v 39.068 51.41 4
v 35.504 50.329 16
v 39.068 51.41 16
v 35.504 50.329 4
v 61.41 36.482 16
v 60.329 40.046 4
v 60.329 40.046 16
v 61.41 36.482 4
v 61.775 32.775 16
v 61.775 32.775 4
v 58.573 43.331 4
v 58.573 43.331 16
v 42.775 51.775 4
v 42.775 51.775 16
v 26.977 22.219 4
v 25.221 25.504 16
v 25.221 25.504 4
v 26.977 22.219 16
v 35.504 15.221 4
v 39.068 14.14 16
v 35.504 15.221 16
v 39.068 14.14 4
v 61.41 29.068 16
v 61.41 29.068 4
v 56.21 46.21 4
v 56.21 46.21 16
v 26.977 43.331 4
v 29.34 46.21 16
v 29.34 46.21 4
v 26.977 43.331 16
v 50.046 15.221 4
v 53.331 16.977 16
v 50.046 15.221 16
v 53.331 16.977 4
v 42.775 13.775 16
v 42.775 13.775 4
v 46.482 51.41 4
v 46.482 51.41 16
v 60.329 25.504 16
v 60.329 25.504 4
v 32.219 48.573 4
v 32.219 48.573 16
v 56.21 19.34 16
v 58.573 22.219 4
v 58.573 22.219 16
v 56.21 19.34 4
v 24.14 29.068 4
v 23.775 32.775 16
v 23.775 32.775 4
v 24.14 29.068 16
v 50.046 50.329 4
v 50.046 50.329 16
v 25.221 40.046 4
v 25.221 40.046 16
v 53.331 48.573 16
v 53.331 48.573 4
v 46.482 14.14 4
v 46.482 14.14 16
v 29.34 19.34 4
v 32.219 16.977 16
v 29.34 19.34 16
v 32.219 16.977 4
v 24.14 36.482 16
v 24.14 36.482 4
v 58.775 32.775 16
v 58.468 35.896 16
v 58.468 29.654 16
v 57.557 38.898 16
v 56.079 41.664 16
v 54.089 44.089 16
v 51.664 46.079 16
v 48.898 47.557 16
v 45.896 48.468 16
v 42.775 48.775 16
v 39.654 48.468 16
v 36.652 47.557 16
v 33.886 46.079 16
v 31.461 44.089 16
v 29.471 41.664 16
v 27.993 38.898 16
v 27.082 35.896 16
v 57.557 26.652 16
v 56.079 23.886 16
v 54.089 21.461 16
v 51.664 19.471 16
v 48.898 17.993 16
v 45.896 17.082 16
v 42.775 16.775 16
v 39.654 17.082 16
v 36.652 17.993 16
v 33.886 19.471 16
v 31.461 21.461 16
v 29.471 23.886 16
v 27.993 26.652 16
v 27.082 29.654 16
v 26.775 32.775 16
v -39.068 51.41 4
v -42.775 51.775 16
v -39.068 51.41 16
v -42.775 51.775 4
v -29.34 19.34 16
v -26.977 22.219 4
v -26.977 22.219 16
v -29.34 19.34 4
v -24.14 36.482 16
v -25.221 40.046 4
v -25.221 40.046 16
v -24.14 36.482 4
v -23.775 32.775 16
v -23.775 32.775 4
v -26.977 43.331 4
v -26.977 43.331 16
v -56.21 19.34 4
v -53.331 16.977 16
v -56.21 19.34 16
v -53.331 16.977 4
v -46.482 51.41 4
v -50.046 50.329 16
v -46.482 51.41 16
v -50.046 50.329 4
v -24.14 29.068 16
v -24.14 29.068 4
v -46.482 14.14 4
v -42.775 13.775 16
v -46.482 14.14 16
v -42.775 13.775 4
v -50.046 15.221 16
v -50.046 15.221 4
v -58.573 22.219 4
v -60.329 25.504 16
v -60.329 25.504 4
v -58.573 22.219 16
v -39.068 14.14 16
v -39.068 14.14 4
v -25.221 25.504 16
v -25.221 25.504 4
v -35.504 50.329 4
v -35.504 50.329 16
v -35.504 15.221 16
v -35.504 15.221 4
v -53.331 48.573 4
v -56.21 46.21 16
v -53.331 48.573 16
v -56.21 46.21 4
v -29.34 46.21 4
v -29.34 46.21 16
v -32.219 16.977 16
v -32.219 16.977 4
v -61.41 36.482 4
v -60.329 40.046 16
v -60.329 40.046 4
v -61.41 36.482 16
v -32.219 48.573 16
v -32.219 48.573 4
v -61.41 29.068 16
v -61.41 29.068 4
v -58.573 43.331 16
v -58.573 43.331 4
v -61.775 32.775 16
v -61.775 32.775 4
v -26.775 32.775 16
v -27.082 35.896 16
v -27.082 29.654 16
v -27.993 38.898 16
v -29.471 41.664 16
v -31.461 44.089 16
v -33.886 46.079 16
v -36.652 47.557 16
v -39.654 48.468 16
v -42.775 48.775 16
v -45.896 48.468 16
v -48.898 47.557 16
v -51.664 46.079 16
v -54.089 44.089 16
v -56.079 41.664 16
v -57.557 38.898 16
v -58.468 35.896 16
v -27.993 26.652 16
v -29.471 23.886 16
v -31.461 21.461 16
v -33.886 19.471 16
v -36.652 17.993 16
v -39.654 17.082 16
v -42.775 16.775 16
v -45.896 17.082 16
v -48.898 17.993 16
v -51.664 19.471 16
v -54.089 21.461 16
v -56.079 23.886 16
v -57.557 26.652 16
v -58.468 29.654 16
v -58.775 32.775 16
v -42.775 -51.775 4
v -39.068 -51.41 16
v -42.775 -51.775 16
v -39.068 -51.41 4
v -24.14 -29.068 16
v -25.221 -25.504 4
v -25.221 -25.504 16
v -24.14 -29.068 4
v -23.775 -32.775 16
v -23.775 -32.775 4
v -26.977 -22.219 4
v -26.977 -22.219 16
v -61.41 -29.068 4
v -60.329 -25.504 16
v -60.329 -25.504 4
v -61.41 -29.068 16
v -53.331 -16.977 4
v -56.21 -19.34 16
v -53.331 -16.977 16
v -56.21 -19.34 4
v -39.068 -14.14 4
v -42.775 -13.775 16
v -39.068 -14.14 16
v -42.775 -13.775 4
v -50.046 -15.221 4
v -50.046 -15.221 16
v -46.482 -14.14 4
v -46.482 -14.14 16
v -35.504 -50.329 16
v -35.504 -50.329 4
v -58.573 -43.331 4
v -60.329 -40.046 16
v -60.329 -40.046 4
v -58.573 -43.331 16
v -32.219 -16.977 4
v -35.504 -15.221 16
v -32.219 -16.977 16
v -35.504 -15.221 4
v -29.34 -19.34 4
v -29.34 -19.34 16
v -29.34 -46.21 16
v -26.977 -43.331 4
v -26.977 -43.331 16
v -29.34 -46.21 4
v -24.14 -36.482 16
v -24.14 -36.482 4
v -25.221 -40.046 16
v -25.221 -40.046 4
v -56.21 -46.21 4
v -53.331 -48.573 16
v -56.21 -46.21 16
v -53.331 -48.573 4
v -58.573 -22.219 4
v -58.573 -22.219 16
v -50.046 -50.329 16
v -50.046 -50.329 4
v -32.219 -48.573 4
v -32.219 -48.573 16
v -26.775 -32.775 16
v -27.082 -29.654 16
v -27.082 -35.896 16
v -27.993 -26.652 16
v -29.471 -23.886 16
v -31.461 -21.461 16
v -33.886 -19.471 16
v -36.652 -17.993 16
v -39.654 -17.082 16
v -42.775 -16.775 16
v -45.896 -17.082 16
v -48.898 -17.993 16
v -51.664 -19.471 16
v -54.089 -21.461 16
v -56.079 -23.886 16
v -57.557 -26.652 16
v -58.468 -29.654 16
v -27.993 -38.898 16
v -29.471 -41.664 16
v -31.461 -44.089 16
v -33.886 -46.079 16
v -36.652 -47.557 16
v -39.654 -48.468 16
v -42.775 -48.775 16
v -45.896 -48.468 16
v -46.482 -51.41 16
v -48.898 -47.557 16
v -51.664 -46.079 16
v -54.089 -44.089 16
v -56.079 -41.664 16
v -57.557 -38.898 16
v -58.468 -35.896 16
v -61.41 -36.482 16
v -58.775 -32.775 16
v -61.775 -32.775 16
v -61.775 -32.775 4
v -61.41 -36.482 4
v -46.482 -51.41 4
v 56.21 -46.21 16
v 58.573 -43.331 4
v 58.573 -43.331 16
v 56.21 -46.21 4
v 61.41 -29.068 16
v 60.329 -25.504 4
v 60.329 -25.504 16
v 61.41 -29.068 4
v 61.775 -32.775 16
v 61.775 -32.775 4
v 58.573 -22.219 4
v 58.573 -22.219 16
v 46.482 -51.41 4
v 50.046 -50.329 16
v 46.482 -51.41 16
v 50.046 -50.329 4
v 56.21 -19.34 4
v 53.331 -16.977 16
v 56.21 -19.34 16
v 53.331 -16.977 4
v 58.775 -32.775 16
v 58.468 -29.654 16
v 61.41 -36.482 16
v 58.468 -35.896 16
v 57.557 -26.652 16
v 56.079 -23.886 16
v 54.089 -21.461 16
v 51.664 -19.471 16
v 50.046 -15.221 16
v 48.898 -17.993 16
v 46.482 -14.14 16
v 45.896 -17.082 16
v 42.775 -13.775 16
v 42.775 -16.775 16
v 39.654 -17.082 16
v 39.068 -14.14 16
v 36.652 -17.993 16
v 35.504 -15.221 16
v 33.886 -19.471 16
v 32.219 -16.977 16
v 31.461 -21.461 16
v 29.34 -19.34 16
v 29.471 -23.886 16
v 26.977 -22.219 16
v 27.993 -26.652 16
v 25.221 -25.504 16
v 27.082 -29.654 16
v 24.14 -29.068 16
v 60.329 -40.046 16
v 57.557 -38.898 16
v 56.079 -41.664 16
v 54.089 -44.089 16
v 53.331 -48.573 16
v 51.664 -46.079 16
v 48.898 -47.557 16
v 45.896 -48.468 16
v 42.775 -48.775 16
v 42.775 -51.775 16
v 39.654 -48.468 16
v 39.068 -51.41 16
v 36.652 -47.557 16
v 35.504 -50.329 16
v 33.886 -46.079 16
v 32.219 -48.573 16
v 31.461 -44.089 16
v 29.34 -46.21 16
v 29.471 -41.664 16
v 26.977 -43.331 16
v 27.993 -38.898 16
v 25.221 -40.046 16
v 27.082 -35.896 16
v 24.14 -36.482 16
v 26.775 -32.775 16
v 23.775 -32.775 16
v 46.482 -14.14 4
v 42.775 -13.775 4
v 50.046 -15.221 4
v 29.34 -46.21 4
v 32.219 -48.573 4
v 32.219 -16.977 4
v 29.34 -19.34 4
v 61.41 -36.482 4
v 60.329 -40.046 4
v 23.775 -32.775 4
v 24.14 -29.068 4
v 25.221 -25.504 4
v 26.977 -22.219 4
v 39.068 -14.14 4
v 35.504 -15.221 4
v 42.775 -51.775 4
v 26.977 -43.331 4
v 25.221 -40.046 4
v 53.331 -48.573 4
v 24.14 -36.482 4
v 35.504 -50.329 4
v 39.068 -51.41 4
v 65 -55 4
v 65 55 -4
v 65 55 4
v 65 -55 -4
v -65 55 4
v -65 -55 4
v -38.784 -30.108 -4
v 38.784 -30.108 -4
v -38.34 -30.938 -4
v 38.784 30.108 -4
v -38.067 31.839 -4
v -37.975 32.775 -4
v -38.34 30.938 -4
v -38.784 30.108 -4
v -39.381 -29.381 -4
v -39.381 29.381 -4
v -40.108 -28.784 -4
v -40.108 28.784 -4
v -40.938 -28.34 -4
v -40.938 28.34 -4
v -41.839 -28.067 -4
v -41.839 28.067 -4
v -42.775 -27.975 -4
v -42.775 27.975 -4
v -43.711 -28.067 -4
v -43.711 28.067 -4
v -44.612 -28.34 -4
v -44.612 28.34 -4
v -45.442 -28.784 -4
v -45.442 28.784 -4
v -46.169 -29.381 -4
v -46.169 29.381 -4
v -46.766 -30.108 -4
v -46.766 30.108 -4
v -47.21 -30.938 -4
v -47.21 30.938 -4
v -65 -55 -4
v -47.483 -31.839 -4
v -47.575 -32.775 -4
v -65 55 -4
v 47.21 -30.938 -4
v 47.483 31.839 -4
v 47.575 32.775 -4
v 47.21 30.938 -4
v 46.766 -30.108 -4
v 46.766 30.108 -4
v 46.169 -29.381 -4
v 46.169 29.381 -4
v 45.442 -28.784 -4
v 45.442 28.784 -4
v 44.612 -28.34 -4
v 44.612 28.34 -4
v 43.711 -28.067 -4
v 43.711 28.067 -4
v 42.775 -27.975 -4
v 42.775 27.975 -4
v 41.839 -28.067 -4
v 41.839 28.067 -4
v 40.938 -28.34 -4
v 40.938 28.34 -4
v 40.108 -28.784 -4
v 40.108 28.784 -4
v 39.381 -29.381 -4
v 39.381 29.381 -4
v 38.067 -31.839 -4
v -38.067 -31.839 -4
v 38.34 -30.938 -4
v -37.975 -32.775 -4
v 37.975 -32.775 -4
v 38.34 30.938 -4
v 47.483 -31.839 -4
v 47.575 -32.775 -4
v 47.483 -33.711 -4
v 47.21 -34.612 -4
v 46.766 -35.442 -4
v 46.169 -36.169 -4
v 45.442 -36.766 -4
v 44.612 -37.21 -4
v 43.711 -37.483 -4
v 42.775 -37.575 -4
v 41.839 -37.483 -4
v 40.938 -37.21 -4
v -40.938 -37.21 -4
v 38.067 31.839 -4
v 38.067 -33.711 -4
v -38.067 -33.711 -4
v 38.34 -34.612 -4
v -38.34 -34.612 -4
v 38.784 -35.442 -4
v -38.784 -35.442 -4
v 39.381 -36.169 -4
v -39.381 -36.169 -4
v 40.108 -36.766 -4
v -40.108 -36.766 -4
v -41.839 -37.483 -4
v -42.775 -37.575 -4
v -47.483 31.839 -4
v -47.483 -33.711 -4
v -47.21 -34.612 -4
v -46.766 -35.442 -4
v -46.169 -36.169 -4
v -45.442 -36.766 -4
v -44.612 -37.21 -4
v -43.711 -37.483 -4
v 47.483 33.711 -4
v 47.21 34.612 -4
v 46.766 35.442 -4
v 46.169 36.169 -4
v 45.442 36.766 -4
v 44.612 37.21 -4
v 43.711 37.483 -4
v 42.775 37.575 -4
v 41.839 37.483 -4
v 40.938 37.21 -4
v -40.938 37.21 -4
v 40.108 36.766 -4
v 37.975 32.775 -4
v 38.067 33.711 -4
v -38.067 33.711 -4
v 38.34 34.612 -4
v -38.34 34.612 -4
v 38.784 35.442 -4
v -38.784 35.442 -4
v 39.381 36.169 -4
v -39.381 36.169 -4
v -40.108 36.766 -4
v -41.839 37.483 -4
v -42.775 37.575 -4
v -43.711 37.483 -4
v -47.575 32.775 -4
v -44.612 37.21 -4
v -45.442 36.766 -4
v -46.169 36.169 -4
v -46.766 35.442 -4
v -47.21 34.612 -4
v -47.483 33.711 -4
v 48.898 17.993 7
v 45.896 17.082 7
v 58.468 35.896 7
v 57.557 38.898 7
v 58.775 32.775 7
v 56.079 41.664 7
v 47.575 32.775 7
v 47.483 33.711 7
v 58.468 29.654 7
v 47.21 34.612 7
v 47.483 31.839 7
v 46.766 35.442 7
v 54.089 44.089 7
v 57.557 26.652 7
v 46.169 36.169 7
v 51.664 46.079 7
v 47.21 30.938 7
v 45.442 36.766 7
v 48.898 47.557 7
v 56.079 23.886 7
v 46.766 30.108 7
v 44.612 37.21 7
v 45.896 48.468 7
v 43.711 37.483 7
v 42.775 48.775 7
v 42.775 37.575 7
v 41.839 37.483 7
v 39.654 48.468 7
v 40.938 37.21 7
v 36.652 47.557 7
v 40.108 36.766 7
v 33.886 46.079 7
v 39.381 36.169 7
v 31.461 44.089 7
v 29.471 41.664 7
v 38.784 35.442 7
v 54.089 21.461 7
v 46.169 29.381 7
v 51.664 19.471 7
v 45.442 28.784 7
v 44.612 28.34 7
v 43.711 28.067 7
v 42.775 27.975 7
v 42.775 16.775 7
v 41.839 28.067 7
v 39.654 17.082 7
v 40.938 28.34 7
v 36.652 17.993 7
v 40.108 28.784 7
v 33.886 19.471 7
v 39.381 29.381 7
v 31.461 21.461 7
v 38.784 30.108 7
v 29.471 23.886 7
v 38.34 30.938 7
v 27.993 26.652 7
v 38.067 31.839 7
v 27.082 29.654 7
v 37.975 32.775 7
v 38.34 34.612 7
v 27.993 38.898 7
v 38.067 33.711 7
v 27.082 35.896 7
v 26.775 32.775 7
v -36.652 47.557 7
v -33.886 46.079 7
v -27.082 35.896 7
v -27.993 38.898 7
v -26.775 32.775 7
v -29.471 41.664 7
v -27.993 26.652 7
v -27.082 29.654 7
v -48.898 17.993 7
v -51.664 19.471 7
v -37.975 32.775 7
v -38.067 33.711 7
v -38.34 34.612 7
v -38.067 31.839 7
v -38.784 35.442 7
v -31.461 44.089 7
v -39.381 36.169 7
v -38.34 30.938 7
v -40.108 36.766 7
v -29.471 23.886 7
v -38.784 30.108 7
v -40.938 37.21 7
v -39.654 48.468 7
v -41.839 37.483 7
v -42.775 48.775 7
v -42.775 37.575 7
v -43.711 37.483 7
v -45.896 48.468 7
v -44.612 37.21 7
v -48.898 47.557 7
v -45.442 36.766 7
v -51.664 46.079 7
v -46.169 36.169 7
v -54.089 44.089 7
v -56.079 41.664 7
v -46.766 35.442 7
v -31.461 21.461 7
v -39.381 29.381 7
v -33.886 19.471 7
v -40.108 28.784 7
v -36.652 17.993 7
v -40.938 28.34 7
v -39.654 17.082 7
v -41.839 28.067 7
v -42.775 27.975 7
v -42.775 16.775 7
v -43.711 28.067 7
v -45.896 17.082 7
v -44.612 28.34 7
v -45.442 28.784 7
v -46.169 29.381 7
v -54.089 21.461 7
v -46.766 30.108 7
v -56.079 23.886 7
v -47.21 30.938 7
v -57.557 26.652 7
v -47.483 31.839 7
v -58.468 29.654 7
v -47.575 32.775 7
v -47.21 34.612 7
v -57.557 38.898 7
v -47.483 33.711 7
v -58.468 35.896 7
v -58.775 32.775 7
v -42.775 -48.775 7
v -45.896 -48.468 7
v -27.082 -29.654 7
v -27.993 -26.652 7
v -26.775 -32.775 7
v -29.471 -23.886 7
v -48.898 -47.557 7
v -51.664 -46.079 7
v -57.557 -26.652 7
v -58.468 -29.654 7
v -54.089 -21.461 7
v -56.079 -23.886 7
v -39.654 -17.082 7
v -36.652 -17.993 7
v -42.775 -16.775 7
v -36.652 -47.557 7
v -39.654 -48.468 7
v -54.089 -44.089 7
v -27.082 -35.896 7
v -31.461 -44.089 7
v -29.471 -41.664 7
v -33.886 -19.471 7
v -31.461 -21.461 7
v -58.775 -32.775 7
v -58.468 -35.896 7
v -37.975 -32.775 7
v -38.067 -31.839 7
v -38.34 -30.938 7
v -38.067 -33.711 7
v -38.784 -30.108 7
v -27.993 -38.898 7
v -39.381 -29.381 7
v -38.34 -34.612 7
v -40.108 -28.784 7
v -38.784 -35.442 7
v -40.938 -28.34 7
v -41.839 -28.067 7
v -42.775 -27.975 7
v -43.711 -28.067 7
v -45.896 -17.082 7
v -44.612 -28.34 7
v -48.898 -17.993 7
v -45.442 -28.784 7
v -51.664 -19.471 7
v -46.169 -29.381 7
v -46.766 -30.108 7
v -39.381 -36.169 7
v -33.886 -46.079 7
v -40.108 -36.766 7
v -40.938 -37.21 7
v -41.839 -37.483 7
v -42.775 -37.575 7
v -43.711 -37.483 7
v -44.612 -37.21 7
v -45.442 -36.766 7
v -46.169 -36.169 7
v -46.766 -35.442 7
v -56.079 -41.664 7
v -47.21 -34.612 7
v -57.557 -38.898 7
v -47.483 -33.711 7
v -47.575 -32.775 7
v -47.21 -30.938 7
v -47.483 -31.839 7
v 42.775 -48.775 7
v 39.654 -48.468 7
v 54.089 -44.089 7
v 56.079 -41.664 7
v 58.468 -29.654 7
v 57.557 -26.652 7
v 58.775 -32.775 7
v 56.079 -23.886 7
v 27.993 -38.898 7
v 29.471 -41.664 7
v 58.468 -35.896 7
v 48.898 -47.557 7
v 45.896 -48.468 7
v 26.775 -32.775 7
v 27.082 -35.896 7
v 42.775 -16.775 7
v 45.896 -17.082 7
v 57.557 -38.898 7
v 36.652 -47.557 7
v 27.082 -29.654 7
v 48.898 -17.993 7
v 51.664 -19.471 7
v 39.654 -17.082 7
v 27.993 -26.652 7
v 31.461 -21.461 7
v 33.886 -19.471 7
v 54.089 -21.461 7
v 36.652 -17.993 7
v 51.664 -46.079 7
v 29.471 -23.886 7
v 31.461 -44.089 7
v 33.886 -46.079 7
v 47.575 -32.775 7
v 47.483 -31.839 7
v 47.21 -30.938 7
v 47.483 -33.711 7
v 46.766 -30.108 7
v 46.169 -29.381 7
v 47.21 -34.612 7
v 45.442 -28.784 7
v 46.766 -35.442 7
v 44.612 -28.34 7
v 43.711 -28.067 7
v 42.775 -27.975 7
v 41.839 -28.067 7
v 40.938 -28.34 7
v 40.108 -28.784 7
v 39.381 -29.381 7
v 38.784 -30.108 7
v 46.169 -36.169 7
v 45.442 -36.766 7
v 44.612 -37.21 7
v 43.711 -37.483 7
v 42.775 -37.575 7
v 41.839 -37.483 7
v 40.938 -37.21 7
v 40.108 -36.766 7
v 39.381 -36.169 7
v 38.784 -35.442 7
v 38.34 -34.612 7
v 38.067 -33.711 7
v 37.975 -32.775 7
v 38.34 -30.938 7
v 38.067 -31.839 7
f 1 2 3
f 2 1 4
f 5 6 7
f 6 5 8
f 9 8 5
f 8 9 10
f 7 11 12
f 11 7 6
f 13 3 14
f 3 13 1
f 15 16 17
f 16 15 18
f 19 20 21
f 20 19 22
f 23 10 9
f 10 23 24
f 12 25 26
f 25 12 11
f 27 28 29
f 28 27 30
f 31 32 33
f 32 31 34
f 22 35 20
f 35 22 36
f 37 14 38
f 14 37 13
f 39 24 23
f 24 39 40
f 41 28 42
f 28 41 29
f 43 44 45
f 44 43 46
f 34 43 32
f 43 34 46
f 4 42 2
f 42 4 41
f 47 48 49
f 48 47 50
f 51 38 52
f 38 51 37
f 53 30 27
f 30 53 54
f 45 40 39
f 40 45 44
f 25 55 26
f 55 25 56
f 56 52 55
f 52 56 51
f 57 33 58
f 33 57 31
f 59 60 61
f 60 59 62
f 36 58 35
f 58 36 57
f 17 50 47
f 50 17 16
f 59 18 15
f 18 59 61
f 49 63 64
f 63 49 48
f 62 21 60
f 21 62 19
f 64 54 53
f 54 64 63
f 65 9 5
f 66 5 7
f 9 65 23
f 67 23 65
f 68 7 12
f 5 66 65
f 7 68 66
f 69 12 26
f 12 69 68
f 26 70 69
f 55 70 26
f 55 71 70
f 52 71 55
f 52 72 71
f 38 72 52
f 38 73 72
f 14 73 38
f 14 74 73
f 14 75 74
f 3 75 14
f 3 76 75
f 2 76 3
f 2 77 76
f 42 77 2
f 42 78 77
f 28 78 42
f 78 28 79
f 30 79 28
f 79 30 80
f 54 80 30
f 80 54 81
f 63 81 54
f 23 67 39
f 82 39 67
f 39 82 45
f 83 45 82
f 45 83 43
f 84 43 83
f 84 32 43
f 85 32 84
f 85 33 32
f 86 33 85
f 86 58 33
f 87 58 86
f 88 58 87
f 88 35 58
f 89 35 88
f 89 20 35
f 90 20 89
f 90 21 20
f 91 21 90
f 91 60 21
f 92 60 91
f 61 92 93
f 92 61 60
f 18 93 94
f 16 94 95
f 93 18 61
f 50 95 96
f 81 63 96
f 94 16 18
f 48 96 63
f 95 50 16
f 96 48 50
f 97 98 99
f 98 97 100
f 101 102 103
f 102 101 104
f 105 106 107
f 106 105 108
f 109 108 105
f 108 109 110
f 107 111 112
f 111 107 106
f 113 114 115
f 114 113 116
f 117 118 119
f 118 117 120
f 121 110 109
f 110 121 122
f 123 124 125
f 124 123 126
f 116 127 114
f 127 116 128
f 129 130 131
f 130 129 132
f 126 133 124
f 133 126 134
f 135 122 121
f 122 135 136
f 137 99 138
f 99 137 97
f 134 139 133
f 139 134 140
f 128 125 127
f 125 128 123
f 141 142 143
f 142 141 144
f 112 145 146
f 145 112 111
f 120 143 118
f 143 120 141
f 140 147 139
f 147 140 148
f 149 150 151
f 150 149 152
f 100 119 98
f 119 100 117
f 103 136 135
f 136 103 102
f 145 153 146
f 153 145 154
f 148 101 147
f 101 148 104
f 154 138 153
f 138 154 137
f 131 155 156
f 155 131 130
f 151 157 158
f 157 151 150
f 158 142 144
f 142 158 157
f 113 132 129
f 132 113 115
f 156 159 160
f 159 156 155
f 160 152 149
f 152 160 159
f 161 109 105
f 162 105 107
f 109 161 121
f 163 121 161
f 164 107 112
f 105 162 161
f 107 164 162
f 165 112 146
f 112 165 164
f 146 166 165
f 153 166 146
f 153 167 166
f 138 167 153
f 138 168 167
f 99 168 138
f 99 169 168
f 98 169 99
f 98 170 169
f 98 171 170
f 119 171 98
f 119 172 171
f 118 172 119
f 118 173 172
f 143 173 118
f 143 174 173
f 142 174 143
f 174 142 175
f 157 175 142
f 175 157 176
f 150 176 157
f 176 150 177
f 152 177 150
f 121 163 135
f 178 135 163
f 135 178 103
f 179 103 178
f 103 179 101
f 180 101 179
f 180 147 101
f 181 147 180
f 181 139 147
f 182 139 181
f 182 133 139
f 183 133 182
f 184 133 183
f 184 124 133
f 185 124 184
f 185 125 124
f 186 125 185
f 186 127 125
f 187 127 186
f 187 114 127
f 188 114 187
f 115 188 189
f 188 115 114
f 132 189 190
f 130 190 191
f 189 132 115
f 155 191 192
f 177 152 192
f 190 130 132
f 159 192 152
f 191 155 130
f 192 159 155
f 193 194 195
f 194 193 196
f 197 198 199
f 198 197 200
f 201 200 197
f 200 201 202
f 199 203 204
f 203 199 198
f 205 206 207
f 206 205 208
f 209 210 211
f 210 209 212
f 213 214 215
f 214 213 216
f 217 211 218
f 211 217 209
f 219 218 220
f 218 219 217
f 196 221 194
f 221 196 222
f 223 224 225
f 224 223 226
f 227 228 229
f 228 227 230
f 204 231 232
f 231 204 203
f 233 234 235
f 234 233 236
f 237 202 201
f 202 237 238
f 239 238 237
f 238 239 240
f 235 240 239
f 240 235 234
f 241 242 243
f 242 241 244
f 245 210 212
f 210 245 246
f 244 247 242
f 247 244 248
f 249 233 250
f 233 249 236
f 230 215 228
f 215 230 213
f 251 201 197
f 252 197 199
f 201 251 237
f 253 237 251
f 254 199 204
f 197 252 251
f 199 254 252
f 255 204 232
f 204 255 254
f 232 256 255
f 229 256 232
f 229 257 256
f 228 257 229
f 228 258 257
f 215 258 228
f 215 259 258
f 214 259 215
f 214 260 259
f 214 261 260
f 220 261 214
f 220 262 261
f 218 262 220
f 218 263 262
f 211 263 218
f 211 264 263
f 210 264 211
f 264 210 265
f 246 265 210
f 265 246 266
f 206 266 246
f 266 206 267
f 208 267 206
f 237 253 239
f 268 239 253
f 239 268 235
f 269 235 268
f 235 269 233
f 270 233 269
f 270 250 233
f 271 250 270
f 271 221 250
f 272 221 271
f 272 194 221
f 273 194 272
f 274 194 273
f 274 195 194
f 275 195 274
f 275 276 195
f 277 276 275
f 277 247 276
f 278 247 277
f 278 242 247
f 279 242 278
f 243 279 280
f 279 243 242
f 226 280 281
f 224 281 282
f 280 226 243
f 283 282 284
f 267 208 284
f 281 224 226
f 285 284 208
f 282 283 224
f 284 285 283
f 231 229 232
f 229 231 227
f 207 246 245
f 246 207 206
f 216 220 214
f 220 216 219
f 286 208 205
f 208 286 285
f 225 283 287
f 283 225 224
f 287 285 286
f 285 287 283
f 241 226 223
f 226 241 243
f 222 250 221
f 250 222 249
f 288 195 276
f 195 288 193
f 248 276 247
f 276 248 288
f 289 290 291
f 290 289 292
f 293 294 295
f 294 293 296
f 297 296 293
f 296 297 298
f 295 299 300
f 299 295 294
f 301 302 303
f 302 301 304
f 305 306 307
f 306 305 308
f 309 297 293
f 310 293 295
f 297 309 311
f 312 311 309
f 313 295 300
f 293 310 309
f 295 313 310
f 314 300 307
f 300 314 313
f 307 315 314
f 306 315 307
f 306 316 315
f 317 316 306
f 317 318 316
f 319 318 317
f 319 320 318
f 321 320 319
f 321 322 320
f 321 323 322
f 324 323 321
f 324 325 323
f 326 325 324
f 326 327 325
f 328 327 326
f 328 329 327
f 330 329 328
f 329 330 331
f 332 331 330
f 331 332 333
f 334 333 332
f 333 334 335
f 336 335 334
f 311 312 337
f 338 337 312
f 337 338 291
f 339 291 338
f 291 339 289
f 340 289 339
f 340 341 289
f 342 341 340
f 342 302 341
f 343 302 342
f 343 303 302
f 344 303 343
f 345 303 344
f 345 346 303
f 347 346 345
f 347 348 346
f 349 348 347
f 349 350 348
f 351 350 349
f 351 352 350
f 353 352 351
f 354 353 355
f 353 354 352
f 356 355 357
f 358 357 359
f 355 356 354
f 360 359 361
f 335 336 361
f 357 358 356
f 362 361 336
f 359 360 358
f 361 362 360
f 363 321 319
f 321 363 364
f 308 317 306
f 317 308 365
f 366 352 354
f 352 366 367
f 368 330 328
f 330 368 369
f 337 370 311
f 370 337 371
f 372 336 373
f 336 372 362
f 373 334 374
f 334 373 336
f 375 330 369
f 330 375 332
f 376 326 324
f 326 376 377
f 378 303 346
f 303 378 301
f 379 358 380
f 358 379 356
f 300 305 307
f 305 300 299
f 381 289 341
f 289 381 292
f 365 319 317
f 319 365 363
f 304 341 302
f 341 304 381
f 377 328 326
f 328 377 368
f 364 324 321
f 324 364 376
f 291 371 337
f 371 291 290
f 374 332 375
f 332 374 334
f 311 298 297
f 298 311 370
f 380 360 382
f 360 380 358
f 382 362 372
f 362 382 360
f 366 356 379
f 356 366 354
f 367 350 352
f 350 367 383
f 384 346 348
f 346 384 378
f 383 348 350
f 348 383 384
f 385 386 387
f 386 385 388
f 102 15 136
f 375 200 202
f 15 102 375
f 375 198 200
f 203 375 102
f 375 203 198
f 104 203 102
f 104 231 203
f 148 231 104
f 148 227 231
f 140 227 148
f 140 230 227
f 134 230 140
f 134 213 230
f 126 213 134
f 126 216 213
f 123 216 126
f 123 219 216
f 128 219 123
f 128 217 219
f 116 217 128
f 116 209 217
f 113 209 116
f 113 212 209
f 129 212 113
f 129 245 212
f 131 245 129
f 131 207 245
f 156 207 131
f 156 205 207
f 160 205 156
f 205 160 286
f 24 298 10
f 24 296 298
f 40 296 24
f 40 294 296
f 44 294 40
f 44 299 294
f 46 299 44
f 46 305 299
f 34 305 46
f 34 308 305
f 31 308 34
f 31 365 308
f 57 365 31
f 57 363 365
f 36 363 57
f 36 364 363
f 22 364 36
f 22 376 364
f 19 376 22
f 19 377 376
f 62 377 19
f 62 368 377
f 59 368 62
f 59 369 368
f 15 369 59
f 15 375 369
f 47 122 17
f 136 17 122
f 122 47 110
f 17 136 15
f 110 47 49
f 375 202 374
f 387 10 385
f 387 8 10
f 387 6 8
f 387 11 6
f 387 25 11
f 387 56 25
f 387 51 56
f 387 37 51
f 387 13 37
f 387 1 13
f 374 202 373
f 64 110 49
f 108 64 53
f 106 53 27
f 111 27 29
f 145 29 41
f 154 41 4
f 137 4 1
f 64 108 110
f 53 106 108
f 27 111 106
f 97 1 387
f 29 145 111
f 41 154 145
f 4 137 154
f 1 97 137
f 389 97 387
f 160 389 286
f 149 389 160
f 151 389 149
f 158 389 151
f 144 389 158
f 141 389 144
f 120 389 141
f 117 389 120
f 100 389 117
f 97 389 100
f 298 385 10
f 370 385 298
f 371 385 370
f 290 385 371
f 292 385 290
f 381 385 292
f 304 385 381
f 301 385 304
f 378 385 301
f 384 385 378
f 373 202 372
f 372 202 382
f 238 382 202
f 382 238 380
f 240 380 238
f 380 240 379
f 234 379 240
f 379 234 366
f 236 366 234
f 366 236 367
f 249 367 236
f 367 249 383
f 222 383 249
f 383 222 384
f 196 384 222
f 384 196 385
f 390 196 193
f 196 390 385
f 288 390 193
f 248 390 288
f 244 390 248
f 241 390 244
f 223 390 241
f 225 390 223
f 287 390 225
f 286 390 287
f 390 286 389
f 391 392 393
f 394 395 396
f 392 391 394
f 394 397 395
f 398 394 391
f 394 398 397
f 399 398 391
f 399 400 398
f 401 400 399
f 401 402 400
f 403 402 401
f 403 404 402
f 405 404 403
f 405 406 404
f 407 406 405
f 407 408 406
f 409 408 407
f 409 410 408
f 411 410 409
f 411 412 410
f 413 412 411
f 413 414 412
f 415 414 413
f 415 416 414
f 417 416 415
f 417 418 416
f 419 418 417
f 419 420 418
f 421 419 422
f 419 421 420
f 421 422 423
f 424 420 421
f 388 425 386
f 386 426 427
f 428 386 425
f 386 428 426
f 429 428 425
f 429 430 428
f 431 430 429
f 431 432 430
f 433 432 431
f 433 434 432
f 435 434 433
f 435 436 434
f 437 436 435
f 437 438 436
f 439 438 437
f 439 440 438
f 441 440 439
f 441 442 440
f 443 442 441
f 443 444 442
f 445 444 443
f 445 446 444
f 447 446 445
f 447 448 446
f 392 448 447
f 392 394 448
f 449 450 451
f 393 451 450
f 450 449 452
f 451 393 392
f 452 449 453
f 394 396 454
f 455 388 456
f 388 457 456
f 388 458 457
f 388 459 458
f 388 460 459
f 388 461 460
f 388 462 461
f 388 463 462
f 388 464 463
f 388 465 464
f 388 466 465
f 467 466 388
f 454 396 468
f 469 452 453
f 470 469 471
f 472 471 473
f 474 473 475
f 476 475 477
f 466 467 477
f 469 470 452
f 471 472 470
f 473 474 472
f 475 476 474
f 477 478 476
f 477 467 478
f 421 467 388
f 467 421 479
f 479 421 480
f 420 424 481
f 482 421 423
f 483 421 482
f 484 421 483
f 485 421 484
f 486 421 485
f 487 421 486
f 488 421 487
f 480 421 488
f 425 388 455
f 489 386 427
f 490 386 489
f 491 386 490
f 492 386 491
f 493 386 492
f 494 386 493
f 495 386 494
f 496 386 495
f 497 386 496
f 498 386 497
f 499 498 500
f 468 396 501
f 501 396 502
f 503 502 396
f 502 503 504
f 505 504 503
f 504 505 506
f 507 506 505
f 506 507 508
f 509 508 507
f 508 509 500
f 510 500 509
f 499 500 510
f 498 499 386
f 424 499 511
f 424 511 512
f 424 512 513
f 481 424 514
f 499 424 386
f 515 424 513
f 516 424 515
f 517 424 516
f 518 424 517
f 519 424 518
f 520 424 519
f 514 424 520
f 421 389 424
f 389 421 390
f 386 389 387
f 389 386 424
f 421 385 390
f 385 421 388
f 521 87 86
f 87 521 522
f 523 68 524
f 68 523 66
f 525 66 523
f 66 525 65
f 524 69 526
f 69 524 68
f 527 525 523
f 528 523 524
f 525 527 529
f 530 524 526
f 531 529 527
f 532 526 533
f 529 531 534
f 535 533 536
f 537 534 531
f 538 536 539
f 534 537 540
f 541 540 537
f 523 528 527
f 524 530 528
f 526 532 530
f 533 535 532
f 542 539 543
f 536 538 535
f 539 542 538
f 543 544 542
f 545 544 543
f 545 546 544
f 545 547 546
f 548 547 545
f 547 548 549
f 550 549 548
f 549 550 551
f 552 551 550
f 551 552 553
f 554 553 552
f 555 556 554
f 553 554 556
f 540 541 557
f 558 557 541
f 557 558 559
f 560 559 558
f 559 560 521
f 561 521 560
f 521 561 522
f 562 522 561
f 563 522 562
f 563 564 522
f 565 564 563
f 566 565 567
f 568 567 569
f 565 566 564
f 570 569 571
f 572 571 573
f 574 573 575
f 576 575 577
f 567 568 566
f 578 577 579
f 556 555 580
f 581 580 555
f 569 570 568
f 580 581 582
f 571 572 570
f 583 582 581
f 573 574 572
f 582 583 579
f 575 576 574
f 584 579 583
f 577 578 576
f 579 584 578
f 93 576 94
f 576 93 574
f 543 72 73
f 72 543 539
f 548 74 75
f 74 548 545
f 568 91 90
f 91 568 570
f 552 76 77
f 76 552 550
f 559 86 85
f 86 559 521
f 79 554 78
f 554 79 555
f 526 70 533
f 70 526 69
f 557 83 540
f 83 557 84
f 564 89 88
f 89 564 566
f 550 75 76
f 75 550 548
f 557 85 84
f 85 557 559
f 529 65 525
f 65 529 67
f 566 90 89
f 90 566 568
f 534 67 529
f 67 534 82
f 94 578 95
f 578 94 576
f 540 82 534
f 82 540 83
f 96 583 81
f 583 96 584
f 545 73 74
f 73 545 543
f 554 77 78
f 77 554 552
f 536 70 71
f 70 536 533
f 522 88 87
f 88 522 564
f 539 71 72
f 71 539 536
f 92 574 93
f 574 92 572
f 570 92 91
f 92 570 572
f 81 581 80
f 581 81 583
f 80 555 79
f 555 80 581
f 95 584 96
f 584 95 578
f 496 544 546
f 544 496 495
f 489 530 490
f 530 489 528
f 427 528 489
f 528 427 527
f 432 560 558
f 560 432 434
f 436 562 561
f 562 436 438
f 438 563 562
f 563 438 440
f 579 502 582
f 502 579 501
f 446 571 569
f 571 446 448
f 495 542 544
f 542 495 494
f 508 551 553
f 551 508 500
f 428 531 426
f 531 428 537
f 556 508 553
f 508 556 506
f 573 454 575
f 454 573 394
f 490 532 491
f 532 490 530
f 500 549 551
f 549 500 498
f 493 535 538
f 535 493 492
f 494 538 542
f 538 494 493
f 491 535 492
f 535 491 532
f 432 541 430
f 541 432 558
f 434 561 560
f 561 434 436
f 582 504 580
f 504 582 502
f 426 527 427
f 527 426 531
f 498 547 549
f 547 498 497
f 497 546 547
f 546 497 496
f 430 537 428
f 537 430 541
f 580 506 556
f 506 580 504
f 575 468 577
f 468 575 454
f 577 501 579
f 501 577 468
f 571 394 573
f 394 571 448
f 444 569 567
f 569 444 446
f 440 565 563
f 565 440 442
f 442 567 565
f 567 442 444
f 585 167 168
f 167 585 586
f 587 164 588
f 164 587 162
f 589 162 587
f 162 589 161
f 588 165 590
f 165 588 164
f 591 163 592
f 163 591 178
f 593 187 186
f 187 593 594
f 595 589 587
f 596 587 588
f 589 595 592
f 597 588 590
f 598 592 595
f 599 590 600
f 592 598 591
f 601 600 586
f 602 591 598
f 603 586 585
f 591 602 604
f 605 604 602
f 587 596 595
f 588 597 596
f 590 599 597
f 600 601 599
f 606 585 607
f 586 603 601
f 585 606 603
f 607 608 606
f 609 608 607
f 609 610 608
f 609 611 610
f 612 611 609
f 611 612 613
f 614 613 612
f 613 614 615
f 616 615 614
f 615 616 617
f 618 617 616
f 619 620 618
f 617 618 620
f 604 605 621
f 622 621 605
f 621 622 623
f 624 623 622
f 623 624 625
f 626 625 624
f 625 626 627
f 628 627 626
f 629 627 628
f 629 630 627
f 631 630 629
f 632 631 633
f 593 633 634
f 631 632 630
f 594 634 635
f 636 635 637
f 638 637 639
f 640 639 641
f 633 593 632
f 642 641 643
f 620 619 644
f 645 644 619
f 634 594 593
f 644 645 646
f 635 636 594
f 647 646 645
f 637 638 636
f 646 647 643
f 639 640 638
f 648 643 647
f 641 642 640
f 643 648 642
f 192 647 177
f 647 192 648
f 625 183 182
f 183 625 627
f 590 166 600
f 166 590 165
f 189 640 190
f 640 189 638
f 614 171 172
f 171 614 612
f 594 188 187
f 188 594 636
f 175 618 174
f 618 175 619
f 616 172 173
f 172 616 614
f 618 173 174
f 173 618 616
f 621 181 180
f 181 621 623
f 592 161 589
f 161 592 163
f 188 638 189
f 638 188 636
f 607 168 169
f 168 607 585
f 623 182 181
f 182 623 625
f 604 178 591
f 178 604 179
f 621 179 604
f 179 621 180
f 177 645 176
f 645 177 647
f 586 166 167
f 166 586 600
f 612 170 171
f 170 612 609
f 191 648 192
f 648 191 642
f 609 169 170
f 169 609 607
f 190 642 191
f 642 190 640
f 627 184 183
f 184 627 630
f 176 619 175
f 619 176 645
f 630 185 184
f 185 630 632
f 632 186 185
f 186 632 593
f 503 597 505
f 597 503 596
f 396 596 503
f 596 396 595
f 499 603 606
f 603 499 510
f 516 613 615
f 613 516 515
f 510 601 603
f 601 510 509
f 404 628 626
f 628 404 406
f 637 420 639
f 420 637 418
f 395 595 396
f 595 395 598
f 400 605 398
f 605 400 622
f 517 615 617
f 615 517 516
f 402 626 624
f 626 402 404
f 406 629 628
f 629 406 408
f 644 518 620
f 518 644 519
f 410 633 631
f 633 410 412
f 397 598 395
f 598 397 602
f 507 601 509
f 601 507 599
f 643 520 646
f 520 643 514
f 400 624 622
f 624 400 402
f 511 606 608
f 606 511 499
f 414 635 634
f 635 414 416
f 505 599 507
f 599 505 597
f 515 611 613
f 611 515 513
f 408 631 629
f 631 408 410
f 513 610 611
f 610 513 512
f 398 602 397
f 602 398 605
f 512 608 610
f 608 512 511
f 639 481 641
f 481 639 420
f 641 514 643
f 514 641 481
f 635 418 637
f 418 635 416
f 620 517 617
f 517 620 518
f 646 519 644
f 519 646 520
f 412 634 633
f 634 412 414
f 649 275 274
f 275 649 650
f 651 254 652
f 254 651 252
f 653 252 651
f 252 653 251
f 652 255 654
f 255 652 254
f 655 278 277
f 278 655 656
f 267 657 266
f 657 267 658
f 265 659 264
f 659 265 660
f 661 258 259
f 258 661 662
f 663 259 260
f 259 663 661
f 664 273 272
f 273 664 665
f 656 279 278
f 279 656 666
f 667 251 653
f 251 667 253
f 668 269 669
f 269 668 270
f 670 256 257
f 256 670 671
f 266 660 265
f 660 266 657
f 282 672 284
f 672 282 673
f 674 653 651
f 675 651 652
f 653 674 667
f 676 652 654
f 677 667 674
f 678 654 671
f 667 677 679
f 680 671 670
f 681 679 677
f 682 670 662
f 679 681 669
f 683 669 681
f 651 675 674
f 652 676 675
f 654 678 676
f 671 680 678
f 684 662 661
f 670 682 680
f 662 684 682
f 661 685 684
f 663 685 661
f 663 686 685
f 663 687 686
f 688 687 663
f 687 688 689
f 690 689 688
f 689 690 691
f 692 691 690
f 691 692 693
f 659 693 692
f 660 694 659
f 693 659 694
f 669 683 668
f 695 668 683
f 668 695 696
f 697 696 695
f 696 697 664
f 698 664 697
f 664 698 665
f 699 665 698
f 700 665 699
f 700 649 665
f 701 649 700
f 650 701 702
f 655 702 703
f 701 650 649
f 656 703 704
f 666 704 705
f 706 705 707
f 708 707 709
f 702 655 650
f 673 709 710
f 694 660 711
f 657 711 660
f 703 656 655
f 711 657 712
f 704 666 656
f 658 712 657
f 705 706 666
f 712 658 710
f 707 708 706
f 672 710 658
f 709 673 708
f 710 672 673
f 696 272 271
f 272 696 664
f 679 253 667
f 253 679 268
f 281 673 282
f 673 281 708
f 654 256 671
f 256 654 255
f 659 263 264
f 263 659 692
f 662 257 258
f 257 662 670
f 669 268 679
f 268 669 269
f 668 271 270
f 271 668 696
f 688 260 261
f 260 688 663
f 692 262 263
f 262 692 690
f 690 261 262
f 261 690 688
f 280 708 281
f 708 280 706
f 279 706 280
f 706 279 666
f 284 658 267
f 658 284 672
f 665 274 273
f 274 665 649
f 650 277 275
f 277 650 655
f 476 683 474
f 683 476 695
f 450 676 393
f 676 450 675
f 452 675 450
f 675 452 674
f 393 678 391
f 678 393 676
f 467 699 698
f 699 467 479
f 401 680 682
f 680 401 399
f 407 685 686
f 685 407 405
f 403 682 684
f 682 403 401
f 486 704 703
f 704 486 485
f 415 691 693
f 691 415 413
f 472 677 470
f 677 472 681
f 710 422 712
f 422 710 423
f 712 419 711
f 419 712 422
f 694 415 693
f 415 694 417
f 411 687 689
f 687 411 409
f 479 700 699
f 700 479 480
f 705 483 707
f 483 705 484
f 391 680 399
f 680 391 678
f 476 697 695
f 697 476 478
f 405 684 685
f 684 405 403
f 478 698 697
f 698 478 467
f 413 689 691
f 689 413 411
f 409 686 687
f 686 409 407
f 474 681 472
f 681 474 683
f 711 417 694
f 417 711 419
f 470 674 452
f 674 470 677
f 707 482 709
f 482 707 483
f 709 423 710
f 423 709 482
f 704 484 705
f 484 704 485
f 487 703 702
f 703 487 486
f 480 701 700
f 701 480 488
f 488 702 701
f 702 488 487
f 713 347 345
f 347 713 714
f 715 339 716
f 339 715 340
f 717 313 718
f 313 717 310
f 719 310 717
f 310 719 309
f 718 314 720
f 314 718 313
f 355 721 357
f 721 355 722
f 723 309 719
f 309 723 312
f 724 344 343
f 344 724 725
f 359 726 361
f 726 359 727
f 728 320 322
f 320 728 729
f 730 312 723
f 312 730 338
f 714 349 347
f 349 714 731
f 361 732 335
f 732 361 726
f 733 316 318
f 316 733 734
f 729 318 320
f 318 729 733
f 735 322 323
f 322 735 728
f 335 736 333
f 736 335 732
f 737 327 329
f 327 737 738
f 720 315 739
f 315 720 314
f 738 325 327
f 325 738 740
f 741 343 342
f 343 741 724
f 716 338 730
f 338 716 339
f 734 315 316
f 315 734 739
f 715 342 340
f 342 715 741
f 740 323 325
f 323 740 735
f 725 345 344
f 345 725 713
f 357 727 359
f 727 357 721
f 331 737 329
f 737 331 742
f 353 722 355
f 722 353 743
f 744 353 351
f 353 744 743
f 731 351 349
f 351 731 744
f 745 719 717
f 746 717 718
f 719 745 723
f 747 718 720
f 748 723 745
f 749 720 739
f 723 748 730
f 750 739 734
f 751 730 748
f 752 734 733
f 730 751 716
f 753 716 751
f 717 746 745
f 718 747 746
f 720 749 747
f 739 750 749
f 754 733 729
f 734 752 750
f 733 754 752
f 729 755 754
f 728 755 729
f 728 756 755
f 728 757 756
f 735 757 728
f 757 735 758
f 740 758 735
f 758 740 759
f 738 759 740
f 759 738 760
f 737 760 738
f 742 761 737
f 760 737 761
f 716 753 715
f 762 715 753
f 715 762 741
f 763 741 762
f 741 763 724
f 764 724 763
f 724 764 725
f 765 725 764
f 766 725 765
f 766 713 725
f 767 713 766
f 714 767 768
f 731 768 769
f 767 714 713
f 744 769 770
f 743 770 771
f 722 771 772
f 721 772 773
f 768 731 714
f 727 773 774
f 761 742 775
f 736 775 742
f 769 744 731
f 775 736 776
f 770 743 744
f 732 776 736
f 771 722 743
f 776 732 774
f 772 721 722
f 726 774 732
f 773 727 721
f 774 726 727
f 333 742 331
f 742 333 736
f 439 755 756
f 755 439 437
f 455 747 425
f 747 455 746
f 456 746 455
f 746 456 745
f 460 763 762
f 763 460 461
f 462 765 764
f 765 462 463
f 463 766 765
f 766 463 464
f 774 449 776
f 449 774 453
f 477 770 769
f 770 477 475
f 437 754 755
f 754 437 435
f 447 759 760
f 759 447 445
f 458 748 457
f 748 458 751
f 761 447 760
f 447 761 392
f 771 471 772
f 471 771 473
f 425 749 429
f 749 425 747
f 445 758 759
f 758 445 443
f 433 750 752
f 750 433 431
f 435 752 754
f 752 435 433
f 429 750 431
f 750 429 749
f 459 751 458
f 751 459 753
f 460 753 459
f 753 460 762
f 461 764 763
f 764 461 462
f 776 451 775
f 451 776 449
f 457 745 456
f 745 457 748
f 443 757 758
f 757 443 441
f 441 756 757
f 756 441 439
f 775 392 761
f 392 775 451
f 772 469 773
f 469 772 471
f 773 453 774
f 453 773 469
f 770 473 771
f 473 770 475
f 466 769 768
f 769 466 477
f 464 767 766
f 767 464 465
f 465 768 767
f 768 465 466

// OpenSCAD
$fn = 32;

// ----------------------------------------------------------------------
// Socket pad plate
// bosses with counterbored sockets for the screws
// ----------------------------------------------------------------------

// --- parameters (mm) ---
base_t = 8;             // base plate thickness
boss_h = 12;            // boss height above the base plate
boss_d = 38;            // boss diameter
socket_d = 32;          // socket diameter
socket_depth = 9;       // socket depth from the boss face
bolt_d = 9.6;           // screw clearance hole through the socket floor
plate = [130, 110, 8];  // overall size (x, y, z)
edge = 22.225;          // boss centre offset from the plate edge
pads = 4;               // boss count, one per corner

// --- derived feature positions (mm) ---
height = base_t + boss_h;        // = 20   overall height of the part
corner_x = plate[0] / 2 - edge;  // = 42.77   boss centre X
corner_y = plate[1] / 2 - edge;  // = 32.77   boss centre Y
feature_centers = [
  [corner_x, corner_y],
  [-corner_x, corner_y],
  [-corner_x, -corner_y],
  [corner_x, -corner_y]
];   // boss centres: sockets, holes and the pads themselves are placed from here

// base plate, bosses on feature_centers, socket + through hole in each
difference() {
  union() {
    cube(plate, center = true);
    for (centre = feature_centers)
      translate([centre[0], centre[1], plate[2] / 2 - 1])
        cylinder(d = boss_d, h = boss_h + 1);
  }
  for (centre = feature_centers) {
    translate([centre[0], centre[1], plate[2] / 2 + boss_h - socket_depth])
      cylinder(d = socket_d, h = socket_depth + 1);
    translate([centre[0], centre[1], -height])
      cylinder(d = bolt_d, h = 2 * height + 2);  // through the socket floor
  }
}
